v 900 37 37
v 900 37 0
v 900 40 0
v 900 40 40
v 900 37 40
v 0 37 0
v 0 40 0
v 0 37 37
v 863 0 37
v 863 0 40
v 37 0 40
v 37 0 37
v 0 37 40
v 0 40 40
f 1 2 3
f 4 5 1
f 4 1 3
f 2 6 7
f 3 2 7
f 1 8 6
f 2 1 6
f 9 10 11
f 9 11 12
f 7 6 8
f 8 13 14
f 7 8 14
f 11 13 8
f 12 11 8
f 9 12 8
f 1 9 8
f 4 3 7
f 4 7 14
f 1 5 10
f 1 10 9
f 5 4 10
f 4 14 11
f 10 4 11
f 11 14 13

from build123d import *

# Parameters (mm, degrees)
F1_DEPTH = 900
F2_SIZE  = 37
F3_SIZE  = 37


with BuildPart() as f1:
    # F0 (on Right) → F1 (new body)
    with BuildSketch(Plane.YZ):
        Polygon((37, 37), (37, 0), (40, 0), (40, 40), (0, 40), (0, 37), align=None)
    extrude(amount=F1_DEPTH)

    # F2
    f2_edges = [f1.edges().sort_by_distance(p)[0] for p in [
        (900, 0, 38.5),
    ]]
    chamfer(f2_edges, length=F2_SIZE)

    # F3
    f3_edges = [f1.edges().sort_by_distance(p)[0] for p in [
        (0, 0, 38.5),
    ]]
    chamfer(f3_edges, length=F3_SIZE)


solid = f1.part
